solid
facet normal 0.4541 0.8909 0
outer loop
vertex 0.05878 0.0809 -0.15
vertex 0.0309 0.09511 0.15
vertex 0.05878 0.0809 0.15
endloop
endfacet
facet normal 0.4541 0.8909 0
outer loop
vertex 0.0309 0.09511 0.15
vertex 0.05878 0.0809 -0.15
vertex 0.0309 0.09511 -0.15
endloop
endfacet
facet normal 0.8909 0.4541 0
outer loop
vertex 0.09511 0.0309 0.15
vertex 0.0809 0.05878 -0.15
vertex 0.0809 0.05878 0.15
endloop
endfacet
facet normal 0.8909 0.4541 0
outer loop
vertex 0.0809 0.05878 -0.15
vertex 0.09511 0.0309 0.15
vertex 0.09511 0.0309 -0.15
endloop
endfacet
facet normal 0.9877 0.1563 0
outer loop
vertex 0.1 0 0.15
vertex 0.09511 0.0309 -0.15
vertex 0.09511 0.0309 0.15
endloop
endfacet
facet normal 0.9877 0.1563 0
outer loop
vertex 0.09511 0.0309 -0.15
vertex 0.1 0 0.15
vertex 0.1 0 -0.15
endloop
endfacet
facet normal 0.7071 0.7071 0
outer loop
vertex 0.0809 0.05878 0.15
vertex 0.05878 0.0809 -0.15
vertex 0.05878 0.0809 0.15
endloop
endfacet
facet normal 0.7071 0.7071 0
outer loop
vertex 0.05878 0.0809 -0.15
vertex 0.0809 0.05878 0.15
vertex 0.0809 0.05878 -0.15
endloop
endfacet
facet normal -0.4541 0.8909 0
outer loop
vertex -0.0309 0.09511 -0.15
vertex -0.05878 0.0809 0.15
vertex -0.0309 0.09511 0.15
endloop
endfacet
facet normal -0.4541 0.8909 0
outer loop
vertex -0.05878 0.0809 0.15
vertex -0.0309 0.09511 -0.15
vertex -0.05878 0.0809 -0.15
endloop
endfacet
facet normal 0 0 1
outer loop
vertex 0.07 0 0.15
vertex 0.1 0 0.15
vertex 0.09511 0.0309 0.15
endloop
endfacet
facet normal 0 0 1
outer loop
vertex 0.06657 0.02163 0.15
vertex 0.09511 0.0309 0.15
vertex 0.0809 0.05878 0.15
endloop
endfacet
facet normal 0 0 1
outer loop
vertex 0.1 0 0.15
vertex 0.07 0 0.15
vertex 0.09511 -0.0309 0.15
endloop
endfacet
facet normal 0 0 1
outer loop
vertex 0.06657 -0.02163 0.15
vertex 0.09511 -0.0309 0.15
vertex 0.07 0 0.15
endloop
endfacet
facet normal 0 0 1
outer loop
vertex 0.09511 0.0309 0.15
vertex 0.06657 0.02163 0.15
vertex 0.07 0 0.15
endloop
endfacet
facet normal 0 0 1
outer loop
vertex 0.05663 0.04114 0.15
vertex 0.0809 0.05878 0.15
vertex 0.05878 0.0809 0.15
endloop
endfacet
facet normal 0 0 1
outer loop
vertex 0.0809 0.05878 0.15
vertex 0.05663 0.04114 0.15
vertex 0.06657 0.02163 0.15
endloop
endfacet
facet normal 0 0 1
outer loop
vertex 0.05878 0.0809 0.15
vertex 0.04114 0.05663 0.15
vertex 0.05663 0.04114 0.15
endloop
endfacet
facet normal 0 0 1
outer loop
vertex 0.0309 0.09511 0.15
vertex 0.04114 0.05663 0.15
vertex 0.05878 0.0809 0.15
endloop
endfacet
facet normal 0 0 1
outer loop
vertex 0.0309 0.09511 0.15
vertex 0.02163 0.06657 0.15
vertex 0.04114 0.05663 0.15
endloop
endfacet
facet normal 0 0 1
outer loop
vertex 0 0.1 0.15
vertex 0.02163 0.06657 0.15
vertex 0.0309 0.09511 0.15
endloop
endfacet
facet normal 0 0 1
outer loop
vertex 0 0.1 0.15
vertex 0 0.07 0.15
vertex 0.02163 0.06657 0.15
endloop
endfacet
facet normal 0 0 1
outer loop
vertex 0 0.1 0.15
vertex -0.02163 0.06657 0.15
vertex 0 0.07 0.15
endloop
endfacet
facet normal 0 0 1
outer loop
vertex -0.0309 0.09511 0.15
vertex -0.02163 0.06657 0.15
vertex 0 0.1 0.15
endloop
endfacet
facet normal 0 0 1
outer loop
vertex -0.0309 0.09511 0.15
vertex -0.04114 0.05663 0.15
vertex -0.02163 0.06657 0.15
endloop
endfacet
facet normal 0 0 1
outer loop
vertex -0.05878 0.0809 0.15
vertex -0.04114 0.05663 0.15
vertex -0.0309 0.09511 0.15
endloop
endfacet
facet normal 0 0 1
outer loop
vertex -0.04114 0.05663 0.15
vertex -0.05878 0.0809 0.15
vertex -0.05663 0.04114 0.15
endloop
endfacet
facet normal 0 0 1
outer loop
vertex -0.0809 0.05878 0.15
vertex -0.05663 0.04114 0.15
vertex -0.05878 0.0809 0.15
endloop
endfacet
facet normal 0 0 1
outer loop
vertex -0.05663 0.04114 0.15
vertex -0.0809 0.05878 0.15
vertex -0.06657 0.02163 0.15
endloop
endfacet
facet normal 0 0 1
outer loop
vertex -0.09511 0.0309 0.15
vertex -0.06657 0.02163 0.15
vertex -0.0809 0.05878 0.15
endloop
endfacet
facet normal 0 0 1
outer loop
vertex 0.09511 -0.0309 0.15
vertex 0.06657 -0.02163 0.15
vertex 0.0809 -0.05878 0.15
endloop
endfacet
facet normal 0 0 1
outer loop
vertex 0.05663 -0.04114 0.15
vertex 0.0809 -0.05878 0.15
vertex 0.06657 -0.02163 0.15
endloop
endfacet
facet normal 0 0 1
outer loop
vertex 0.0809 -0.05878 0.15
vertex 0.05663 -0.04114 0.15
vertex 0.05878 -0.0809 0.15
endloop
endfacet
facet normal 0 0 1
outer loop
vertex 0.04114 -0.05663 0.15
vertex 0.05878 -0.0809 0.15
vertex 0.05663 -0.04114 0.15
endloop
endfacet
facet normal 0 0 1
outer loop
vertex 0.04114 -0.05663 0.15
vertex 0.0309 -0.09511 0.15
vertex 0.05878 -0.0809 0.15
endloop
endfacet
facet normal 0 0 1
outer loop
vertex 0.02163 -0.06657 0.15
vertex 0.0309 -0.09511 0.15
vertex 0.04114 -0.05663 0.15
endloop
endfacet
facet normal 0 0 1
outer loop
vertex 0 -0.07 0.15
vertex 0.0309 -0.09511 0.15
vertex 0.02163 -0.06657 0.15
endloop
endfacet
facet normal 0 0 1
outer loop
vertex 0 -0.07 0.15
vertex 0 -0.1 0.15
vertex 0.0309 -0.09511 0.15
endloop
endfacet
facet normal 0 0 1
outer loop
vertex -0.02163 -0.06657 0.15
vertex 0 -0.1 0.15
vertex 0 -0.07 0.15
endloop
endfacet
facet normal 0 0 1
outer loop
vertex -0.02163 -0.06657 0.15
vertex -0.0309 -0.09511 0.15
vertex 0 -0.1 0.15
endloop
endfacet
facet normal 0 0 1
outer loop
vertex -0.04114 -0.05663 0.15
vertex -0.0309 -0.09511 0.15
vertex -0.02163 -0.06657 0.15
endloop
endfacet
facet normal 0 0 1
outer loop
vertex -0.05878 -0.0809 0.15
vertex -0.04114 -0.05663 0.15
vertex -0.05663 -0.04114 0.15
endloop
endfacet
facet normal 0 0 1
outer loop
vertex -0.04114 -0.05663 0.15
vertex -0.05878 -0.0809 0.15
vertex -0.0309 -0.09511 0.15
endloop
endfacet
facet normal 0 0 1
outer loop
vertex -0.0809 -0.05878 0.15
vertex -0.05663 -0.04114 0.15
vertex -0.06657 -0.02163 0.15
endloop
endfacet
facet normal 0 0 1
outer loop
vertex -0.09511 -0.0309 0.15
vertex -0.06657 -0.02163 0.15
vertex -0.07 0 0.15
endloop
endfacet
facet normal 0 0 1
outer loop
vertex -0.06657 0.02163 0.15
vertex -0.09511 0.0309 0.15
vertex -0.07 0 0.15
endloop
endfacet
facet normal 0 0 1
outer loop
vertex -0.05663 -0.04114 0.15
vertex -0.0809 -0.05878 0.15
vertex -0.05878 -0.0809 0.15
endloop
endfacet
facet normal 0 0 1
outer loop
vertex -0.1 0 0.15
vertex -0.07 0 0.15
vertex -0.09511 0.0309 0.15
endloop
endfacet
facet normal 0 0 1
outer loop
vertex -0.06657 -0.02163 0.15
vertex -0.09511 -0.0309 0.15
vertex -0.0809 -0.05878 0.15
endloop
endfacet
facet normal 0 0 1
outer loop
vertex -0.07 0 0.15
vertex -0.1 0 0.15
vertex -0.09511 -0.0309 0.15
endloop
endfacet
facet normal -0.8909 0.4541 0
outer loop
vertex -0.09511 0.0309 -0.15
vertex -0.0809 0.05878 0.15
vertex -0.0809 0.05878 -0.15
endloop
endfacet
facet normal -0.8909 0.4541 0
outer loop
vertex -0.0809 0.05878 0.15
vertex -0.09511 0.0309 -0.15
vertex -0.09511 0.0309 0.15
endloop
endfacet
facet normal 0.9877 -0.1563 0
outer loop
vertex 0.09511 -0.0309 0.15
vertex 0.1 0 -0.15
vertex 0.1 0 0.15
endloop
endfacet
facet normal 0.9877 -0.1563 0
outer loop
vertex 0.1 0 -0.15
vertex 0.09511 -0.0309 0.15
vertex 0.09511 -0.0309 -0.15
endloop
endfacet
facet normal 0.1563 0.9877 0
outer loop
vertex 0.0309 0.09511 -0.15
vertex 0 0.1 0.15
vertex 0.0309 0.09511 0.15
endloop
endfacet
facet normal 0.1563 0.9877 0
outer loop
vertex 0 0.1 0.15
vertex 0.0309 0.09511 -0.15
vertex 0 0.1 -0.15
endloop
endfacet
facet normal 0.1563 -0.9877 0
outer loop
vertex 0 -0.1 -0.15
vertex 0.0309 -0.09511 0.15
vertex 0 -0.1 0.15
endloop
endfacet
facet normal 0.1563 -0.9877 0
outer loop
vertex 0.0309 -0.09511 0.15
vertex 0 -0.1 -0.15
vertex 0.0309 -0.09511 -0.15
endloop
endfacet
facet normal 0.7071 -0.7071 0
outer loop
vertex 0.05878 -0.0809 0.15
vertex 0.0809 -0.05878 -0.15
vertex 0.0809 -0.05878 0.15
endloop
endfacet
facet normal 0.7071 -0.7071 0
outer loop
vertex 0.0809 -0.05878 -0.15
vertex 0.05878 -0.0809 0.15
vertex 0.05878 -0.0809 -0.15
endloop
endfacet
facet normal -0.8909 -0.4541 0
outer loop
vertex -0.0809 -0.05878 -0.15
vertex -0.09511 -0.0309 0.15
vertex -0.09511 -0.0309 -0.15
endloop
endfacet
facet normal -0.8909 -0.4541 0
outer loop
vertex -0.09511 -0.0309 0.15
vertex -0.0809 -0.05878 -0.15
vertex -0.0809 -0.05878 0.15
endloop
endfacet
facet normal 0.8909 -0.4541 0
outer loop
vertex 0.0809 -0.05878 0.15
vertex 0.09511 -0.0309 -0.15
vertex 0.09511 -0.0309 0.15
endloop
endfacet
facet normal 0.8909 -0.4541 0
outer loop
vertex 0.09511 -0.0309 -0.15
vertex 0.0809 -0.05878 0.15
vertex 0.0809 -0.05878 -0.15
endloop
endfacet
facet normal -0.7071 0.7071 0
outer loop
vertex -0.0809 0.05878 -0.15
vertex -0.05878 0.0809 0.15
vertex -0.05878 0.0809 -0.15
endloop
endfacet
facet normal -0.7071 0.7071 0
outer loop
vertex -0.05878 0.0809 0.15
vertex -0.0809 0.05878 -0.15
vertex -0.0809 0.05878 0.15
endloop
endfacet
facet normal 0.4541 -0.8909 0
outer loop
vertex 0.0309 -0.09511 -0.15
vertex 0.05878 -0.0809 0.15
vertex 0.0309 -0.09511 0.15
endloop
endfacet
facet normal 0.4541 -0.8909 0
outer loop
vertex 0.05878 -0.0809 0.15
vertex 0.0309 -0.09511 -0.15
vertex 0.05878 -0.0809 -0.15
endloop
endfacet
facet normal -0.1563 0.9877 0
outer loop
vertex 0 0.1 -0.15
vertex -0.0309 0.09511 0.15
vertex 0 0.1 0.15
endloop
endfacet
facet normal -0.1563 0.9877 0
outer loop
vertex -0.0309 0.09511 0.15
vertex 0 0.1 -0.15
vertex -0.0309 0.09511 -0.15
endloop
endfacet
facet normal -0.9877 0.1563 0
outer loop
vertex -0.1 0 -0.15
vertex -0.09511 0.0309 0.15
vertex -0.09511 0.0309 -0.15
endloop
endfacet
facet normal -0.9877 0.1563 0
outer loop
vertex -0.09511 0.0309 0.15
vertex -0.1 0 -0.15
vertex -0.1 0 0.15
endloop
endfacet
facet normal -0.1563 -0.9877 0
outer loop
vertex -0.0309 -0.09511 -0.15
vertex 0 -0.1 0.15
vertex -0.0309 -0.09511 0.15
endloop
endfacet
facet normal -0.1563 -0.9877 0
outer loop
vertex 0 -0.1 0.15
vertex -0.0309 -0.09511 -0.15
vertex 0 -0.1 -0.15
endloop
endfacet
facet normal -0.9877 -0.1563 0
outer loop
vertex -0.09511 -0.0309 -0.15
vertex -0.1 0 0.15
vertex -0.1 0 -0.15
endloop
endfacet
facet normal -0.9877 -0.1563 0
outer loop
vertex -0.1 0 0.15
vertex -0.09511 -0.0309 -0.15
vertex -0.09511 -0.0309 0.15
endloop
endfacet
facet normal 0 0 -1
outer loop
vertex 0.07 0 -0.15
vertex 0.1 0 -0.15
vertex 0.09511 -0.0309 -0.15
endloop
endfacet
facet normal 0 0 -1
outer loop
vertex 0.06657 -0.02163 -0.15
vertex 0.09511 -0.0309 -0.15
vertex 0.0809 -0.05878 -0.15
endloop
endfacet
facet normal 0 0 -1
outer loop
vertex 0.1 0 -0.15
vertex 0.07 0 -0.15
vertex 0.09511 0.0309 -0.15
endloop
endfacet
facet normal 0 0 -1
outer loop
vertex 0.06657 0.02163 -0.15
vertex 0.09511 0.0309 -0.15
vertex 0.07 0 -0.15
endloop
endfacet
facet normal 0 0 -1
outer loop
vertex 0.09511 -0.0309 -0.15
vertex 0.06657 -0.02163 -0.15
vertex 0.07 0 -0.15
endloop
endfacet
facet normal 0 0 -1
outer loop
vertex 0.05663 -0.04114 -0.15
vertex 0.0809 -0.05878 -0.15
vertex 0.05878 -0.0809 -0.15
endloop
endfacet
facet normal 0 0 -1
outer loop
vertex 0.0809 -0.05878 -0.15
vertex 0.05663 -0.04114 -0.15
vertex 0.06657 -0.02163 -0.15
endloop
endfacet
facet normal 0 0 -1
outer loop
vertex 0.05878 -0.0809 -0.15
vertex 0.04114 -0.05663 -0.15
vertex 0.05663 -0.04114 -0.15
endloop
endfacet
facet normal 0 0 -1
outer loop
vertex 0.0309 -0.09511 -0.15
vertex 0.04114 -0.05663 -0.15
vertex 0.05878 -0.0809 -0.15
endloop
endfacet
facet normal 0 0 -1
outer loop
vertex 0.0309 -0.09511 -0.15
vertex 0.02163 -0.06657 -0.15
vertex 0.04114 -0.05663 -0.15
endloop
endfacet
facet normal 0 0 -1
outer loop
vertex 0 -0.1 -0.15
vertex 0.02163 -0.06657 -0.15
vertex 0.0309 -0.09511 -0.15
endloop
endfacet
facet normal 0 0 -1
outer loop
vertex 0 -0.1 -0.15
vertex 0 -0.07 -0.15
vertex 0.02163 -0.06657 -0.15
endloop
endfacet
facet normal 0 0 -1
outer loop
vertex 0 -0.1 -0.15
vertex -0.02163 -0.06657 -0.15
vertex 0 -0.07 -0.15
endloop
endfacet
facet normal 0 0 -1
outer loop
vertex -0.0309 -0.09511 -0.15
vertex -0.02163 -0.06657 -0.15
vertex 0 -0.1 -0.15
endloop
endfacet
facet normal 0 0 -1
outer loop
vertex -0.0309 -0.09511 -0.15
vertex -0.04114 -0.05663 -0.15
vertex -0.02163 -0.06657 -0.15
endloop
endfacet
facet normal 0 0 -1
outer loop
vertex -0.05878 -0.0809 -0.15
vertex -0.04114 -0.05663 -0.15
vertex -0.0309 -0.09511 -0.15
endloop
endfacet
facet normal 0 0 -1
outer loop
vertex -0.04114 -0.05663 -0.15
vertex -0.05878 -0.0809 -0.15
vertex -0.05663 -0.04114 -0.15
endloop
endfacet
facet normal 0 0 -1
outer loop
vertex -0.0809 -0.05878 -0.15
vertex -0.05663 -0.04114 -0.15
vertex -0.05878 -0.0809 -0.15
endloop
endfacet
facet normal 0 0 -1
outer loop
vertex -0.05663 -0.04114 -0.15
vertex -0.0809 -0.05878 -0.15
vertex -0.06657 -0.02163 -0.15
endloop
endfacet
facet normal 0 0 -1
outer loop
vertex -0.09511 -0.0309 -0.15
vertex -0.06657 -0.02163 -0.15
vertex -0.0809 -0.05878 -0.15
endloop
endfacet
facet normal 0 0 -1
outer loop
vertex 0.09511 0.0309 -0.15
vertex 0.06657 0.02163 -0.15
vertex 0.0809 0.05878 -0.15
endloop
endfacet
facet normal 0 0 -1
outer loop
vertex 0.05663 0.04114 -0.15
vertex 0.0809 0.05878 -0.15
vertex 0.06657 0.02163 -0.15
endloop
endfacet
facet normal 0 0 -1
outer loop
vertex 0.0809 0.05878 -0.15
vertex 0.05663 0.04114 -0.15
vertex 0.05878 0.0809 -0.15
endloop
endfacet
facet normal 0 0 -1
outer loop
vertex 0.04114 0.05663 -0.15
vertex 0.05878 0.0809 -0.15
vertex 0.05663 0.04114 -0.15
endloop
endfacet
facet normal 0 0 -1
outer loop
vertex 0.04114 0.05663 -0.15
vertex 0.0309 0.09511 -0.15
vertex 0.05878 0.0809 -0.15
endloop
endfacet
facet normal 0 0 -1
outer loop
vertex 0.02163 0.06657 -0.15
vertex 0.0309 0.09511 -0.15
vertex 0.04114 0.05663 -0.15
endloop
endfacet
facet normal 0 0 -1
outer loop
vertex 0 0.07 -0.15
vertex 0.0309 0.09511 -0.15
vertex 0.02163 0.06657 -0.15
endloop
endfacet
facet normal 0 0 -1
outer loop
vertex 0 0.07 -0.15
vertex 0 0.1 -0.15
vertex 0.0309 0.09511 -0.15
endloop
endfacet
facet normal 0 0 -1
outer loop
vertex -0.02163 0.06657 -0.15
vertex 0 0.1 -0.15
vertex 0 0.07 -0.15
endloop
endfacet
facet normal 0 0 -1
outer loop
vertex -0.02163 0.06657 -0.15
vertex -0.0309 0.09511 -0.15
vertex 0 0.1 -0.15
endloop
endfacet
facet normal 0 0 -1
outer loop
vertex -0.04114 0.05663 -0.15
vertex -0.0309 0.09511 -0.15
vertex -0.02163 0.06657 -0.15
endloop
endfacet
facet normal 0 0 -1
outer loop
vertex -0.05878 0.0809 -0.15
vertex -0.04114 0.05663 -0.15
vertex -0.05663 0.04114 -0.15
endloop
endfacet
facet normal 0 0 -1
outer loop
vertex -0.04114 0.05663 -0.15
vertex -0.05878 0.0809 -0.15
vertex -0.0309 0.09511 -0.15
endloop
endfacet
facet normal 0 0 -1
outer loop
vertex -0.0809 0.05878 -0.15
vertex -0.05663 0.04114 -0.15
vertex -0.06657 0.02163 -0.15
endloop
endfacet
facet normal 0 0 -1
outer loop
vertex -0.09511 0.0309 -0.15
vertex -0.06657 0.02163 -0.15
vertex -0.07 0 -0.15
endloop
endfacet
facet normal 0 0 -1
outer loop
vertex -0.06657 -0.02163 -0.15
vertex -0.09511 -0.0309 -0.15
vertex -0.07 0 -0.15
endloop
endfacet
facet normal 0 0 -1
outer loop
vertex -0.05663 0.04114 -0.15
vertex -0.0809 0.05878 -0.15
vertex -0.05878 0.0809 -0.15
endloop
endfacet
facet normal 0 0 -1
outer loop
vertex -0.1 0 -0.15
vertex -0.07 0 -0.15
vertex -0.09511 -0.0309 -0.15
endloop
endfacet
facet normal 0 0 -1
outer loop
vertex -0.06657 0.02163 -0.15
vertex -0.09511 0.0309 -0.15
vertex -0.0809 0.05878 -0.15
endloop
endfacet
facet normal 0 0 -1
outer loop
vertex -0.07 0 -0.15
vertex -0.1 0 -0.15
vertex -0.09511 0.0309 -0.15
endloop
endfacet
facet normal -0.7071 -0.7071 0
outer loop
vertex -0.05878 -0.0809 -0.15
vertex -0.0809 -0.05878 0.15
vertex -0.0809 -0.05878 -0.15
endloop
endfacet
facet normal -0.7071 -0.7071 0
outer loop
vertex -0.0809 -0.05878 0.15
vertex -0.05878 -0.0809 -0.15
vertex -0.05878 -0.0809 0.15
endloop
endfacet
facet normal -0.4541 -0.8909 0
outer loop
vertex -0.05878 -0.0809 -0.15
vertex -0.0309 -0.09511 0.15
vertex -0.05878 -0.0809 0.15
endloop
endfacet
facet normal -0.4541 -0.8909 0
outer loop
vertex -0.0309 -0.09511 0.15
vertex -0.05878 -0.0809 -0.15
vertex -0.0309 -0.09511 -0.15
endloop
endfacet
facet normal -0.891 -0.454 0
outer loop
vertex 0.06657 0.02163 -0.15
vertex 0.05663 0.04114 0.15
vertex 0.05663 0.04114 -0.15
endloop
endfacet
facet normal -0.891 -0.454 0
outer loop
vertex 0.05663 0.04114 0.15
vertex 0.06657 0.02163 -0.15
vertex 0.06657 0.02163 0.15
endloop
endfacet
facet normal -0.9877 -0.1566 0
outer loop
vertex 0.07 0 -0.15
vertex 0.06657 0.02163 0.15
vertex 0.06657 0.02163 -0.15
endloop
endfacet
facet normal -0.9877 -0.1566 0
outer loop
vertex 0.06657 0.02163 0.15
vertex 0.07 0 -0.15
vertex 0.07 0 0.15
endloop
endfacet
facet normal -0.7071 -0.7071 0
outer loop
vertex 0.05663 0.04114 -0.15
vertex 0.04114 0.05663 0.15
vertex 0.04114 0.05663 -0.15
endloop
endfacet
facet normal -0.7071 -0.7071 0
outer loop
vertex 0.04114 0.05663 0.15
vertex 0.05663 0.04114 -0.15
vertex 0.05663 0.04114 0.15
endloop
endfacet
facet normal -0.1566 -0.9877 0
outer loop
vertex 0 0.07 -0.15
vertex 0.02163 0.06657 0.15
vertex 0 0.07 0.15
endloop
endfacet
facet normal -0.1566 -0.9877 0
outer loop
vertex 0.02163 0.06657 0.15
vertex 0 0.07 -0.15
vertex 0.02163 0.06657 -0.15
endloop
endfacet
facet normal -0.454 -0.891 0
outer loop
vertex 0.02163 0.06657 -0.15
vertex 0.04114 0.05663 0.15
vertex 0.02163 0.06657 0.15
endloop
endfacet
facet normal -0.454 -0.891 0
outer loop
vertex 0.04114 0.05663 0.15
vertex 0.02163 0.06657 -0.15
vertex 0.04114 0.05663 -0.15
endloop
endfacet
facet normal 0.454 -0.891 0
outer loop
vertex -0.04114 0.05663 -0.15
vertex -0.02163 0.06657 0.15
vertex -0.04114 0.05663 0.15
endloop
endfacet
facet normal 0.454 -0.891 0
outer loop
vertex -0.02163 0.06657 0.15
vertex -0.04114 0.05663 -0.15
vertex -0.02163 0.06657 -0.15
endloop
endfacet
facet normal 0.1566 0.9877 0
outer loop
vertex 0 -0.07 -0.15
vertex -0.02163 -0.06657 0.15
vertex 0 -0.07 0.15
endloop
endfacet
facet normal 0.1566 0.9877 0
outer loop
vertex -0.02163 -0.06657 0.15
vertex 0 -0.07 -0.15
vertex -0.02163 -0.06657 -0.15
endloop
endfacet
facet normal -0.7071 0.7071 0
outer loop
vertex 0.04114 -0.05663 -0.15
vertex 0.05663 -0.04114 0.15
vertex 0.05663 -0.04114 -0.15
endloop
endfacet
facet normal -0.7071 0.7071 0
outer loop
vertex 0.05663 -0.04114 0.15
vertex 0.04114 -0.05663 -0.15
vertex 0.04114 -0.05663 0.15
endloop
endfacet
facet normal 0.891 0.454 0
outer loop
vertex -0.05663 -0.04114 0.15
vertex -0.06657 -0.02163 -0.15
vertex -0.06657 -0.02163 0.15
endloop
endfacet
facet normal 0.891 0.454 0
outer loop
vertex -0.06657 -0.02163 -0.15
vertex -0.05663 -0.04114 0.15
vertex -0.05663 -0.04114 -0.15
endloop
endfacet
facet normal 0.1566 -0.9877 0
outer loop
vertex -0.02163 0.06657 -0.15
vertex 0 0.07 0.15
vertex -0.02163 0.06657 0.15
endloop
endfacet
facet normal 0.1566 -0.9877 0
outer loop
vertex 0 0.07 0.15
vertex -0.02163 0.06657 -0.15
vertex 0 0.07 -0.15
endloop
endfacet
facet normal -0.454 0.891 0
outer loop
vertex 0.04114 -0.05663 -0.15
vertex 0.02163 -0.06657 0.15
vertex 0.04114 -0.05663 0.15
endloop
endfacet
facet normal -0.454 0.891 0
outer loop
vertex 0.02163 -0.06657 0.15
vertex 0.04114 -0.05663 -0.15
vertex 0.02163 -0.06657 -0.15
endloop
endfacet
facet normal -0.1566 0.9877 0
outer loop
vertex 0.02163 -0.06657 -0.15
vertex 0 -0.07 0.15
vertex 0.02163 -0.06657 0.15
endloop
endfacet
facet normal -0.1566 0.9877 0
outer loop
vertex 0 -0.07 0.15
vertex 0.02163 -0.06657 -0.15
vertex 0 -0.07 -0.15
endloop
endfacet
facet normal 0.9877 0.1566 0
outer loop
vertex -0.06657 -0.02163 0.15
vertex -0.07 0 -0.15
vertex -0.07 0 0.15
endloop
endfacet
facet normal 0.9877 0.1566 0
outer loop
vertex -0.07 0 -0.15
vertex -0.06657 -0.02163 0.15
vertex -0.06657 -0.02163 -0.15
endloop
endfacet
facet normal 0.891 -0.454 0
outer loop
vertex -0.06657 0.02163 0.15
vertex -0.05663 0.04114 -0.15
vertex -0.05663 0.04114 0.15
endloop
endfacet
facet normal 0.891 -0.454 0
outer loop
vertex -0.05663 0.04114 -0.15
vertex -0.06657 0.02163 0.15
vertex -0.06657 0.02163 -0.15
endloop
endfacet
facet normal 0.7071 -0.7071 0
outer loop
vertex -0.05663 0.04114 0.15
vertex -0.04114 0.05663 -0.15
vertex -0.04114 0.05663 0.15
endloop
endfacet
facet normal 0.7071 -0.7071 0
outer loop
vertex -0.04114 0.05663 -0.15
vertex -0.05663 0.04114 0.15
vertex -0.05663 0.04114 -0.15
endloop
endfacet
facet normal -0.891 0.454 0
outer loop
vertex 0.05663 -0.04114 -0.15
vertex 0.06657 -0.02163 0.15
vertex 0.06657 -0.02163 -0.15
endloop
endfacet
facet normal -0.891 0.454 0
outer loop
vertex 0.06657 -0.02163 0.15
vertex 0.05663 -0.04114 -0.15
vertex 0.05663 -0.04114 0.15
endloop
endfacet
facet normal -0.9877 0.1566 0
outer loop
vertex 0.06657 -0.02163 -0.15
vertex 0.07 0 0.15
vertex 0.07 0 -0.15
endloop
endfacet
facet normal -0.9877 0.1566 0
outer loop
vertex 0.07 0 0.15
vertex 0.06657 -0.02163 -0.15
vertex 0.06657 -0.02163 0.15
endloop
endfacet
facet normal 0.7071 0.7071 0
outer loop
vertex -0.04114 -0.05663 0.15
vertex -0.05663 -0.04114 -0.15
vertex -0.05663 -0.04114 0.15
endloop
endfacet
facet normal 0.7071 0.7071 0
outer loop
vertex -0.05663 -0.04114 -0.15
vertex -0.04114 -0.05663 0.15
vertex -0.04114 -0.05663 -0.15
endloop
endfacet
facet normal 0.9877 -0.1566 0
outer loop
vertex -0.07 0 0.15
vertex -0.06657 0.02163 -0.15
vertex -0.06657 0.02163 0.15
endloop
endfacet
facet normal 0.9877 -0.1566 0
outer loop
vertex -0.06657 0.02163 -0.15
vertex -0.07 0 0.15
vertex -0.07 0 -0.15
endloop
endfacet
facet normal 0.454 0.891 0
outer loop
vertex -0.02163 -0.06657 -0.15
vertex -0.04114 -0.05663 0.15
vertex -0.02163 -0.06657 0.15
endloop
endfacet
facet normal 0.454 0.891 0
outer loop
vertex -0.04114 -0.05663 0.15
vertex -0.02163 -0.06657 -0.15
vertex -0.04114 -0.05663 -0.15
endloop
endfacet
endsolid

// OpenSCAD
r_out=0.1;
height=0.3;
r_in=0.07;
n_facets=20;

difference(){
translate([0,0,-0.3/2]) cylinder(r=r_out, h=height, $fn=n_facets);
translate([0,0,-0.3/2]) cylinder(r=r_in, h=height, $fn=n_facets);
}
